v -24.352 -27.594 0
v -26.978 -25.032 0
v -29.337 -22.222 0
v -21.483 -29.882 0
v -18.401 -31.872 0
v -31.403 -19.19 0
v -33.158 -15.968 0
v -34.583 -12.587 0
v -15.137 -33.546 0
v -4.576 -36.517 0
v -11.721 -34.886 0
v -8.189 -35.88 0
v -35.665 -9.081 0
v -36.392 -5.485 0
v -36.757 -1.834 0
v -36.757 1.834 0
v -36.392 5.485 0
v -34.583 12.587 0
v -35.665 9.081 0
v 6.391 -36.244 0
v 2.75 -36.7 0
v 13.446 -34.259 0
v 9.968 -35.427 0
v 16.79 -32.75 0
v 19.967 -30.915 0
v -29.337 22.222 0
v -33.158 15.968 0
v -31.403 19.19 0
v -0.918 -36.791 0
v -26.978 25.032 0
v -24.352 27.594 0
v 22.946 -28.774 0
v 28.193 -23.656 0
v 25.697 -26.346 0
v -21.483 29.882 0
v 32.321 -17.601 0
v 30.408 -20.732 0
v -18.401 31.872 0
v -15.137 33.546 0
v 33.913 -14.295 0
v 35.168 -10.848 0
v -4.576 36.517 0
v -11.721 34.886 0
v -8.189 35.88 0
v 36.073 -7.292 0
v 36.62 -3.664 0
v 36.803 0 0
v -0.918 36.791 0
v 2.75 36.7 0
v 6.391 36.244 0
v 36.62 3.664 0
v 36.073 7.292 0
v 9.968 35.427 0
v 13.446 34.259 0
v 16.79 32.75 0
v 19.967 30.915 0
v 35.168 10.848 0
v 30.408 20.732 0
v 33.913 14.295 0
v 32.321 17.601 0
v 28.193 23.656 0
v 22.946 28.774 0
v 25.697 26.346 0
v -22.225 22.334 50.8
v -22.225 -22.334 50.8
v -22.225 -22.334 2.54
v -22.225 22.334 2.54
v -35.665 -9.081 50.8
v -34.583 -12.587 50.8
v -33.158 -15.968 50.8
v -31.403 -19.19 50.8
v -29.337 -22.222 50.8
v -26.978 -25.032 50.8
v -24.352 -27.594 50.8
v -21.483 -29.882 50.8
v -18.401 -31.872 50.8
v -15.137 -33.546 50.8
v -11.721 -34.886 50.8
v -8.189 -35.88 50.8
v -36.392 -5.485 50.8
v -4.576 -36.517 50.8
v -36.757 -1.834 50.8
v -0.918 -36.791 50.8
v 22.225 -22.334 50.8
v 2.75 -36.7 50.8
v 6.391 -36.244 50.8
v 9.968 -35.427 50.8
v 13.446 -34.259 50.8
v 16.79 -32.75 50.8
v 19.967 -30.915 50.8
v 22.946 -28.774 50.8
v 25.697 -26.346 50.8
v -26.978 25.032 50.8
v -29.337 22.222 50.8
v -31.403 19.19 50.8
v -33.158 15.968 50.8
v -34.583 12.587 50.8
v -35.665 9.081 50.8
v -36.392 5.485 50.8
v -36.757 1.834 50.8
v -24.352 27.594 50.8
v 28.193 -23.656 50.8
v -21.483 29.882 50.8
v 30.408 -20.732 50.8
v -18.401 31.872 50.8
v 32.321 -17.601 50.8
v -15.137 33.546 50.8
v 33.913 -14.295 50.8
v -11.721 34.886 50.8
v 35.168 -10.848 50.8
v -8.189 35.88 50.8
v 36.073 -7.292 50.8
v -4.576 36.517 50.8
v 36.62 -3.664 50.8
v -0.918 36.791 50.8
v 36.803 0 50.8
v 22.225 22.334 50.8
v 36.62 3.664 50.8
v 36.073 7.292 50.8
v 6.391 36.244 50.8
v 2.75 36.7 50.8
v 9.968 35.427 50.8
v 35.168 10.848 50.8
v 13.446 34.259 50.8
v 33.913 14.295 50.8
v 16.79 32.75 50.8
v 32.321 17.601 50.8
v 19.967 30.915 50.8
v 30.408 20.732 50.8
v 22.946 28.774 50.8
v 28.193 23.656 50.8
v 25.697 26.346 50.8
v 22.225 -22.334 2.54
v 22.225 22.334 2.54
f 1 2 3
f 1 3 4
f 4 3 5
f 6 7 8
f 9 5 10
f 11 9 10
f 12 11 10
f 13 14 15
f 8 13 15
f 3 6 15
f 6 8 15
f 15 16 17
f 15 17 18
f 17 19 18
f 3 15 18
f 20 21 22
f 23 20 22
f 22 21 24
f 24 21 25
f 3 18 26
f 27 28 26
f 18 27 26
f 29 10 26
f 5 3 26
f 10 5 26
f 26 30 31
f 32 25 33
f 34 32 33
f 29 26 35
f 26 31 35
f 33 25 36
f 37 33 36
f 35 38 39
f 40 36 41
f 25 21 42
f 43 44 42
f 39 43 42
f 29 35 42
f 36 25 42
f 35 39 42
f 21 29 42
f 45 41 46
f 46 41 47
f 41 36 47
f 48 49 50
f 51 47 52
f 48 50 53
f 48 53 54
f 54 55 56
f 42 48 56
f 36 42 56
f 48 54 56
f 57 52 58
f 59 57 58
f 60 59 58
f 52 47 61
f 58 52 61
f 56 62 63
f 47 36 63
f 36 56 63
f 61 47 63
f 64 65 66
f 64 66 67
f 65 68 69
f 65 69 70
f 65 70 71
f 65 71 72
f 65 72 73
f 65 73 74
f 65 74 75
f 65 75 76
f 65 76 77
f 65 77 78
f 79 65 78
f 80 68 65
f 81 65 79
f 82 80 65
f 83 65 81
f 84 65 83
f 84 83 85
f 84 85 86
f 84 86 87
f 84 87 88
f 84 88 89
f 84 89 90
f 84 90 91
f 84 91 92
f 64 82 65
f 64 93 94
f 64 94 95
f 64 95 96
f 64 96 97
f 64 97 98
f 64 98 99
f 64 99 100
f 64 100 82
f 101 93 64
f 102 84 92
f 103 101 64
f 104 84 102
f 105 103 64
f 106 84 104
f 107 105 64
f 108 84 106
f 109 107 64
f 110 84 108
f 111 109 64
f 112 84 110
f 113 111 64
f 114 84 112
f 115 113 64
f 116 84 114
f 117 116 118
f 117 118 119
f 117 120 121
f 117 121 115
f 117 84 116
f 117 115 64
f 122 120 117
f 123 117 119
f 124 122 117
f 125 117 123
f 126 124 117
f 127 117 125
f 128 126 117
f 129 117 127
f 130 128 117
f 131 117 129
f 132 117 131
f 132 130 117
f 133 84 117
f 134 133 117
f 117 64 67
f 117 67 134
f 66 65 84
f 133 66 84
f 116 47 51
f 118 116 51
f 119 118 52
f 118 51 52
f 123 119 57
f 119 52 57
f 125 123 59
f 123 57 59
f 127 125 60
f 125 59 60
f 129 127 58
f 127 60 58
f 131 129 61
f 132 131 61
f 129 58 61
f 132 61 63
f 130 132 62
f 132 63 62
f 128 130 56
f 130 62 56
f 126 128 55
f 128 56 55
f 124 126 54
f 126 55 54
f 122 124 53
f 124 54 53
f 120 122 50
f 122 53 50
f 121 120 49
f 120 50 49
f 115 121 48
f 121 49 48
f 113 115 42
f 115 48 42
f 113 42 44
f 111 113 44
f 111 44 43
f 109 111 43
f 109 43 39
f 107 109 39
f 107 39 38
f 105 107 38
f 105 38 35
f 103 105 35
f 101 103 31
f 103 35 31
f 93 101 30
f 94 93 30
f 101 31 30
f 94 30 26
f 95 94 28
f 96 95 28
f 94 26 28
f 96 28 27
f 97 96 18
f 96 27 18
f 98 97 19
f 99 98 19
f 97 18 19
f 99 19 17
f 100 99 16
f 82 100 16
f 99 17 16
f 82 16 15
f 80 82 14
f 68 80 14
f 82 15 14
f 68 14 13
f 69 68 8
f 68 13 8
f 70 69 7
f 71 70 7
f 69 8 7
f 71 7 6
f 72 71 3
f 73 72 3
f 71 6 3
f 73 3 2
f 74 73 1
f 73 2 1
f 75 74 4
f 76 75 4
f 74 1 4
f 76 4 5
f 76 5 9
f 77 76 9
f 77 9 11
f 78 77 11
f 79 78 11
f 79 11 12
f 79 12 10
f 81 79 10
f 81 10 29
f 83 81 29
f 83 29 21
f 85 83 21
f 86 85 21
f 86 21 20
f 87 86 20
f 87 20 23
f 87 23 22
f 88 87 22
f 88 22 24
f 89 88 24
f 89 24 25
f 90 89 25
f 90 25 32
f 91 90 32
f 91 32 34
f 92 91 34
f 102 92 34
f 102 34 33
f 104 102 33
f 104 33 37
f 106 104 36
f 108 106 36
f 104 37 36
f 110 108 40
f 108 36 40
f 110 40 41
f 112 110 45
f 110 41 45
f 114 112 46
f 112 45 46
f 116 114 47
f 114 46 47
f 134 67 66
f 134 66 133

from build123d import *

# Parameters (mm, degrees)
F0_W     = 50.8
F0_H     = 50.8
F1_DEPTH = 50.8
F2_W     = 44.45
F2_H     = 44.66816
F3_DEPTH = 48.26
F4_R     = 36.802798
F5_DEPTH = 50.8
F7_DEPTH = 48.26


with BuildPart() as f1:
    # F0 (on Top) → F1 (new body)
    with BuildSketch(Plane.XY):
        Rectangle(F0_W, F0_H)
    extrude(amount=F1_DEPTH)

    # F2 (on face) → F3 (cut)
    with BuildSketch(Plane.XY.offset(50.8)):
        Rectangle(F2_W, F2_H)
    extrude(amount=-F3_DEPTH, mode=Mode.SUBTRACT)

    # F4 (on Top) → F5 (join)
    with BuildSketch(Plane.XY):
        Circle(F4_R)
    extrude(amount=F5_DEPTH)

    # F2 (on face) → F7 (cut)
    with BuildSketch(Plane.XY.offset(50.8)):
        Rectangle(F2_W, F2_H)
    extrude(amount=-F7_DEPTH, mode=Mode.SUBTRACT)


solid = f1.part
